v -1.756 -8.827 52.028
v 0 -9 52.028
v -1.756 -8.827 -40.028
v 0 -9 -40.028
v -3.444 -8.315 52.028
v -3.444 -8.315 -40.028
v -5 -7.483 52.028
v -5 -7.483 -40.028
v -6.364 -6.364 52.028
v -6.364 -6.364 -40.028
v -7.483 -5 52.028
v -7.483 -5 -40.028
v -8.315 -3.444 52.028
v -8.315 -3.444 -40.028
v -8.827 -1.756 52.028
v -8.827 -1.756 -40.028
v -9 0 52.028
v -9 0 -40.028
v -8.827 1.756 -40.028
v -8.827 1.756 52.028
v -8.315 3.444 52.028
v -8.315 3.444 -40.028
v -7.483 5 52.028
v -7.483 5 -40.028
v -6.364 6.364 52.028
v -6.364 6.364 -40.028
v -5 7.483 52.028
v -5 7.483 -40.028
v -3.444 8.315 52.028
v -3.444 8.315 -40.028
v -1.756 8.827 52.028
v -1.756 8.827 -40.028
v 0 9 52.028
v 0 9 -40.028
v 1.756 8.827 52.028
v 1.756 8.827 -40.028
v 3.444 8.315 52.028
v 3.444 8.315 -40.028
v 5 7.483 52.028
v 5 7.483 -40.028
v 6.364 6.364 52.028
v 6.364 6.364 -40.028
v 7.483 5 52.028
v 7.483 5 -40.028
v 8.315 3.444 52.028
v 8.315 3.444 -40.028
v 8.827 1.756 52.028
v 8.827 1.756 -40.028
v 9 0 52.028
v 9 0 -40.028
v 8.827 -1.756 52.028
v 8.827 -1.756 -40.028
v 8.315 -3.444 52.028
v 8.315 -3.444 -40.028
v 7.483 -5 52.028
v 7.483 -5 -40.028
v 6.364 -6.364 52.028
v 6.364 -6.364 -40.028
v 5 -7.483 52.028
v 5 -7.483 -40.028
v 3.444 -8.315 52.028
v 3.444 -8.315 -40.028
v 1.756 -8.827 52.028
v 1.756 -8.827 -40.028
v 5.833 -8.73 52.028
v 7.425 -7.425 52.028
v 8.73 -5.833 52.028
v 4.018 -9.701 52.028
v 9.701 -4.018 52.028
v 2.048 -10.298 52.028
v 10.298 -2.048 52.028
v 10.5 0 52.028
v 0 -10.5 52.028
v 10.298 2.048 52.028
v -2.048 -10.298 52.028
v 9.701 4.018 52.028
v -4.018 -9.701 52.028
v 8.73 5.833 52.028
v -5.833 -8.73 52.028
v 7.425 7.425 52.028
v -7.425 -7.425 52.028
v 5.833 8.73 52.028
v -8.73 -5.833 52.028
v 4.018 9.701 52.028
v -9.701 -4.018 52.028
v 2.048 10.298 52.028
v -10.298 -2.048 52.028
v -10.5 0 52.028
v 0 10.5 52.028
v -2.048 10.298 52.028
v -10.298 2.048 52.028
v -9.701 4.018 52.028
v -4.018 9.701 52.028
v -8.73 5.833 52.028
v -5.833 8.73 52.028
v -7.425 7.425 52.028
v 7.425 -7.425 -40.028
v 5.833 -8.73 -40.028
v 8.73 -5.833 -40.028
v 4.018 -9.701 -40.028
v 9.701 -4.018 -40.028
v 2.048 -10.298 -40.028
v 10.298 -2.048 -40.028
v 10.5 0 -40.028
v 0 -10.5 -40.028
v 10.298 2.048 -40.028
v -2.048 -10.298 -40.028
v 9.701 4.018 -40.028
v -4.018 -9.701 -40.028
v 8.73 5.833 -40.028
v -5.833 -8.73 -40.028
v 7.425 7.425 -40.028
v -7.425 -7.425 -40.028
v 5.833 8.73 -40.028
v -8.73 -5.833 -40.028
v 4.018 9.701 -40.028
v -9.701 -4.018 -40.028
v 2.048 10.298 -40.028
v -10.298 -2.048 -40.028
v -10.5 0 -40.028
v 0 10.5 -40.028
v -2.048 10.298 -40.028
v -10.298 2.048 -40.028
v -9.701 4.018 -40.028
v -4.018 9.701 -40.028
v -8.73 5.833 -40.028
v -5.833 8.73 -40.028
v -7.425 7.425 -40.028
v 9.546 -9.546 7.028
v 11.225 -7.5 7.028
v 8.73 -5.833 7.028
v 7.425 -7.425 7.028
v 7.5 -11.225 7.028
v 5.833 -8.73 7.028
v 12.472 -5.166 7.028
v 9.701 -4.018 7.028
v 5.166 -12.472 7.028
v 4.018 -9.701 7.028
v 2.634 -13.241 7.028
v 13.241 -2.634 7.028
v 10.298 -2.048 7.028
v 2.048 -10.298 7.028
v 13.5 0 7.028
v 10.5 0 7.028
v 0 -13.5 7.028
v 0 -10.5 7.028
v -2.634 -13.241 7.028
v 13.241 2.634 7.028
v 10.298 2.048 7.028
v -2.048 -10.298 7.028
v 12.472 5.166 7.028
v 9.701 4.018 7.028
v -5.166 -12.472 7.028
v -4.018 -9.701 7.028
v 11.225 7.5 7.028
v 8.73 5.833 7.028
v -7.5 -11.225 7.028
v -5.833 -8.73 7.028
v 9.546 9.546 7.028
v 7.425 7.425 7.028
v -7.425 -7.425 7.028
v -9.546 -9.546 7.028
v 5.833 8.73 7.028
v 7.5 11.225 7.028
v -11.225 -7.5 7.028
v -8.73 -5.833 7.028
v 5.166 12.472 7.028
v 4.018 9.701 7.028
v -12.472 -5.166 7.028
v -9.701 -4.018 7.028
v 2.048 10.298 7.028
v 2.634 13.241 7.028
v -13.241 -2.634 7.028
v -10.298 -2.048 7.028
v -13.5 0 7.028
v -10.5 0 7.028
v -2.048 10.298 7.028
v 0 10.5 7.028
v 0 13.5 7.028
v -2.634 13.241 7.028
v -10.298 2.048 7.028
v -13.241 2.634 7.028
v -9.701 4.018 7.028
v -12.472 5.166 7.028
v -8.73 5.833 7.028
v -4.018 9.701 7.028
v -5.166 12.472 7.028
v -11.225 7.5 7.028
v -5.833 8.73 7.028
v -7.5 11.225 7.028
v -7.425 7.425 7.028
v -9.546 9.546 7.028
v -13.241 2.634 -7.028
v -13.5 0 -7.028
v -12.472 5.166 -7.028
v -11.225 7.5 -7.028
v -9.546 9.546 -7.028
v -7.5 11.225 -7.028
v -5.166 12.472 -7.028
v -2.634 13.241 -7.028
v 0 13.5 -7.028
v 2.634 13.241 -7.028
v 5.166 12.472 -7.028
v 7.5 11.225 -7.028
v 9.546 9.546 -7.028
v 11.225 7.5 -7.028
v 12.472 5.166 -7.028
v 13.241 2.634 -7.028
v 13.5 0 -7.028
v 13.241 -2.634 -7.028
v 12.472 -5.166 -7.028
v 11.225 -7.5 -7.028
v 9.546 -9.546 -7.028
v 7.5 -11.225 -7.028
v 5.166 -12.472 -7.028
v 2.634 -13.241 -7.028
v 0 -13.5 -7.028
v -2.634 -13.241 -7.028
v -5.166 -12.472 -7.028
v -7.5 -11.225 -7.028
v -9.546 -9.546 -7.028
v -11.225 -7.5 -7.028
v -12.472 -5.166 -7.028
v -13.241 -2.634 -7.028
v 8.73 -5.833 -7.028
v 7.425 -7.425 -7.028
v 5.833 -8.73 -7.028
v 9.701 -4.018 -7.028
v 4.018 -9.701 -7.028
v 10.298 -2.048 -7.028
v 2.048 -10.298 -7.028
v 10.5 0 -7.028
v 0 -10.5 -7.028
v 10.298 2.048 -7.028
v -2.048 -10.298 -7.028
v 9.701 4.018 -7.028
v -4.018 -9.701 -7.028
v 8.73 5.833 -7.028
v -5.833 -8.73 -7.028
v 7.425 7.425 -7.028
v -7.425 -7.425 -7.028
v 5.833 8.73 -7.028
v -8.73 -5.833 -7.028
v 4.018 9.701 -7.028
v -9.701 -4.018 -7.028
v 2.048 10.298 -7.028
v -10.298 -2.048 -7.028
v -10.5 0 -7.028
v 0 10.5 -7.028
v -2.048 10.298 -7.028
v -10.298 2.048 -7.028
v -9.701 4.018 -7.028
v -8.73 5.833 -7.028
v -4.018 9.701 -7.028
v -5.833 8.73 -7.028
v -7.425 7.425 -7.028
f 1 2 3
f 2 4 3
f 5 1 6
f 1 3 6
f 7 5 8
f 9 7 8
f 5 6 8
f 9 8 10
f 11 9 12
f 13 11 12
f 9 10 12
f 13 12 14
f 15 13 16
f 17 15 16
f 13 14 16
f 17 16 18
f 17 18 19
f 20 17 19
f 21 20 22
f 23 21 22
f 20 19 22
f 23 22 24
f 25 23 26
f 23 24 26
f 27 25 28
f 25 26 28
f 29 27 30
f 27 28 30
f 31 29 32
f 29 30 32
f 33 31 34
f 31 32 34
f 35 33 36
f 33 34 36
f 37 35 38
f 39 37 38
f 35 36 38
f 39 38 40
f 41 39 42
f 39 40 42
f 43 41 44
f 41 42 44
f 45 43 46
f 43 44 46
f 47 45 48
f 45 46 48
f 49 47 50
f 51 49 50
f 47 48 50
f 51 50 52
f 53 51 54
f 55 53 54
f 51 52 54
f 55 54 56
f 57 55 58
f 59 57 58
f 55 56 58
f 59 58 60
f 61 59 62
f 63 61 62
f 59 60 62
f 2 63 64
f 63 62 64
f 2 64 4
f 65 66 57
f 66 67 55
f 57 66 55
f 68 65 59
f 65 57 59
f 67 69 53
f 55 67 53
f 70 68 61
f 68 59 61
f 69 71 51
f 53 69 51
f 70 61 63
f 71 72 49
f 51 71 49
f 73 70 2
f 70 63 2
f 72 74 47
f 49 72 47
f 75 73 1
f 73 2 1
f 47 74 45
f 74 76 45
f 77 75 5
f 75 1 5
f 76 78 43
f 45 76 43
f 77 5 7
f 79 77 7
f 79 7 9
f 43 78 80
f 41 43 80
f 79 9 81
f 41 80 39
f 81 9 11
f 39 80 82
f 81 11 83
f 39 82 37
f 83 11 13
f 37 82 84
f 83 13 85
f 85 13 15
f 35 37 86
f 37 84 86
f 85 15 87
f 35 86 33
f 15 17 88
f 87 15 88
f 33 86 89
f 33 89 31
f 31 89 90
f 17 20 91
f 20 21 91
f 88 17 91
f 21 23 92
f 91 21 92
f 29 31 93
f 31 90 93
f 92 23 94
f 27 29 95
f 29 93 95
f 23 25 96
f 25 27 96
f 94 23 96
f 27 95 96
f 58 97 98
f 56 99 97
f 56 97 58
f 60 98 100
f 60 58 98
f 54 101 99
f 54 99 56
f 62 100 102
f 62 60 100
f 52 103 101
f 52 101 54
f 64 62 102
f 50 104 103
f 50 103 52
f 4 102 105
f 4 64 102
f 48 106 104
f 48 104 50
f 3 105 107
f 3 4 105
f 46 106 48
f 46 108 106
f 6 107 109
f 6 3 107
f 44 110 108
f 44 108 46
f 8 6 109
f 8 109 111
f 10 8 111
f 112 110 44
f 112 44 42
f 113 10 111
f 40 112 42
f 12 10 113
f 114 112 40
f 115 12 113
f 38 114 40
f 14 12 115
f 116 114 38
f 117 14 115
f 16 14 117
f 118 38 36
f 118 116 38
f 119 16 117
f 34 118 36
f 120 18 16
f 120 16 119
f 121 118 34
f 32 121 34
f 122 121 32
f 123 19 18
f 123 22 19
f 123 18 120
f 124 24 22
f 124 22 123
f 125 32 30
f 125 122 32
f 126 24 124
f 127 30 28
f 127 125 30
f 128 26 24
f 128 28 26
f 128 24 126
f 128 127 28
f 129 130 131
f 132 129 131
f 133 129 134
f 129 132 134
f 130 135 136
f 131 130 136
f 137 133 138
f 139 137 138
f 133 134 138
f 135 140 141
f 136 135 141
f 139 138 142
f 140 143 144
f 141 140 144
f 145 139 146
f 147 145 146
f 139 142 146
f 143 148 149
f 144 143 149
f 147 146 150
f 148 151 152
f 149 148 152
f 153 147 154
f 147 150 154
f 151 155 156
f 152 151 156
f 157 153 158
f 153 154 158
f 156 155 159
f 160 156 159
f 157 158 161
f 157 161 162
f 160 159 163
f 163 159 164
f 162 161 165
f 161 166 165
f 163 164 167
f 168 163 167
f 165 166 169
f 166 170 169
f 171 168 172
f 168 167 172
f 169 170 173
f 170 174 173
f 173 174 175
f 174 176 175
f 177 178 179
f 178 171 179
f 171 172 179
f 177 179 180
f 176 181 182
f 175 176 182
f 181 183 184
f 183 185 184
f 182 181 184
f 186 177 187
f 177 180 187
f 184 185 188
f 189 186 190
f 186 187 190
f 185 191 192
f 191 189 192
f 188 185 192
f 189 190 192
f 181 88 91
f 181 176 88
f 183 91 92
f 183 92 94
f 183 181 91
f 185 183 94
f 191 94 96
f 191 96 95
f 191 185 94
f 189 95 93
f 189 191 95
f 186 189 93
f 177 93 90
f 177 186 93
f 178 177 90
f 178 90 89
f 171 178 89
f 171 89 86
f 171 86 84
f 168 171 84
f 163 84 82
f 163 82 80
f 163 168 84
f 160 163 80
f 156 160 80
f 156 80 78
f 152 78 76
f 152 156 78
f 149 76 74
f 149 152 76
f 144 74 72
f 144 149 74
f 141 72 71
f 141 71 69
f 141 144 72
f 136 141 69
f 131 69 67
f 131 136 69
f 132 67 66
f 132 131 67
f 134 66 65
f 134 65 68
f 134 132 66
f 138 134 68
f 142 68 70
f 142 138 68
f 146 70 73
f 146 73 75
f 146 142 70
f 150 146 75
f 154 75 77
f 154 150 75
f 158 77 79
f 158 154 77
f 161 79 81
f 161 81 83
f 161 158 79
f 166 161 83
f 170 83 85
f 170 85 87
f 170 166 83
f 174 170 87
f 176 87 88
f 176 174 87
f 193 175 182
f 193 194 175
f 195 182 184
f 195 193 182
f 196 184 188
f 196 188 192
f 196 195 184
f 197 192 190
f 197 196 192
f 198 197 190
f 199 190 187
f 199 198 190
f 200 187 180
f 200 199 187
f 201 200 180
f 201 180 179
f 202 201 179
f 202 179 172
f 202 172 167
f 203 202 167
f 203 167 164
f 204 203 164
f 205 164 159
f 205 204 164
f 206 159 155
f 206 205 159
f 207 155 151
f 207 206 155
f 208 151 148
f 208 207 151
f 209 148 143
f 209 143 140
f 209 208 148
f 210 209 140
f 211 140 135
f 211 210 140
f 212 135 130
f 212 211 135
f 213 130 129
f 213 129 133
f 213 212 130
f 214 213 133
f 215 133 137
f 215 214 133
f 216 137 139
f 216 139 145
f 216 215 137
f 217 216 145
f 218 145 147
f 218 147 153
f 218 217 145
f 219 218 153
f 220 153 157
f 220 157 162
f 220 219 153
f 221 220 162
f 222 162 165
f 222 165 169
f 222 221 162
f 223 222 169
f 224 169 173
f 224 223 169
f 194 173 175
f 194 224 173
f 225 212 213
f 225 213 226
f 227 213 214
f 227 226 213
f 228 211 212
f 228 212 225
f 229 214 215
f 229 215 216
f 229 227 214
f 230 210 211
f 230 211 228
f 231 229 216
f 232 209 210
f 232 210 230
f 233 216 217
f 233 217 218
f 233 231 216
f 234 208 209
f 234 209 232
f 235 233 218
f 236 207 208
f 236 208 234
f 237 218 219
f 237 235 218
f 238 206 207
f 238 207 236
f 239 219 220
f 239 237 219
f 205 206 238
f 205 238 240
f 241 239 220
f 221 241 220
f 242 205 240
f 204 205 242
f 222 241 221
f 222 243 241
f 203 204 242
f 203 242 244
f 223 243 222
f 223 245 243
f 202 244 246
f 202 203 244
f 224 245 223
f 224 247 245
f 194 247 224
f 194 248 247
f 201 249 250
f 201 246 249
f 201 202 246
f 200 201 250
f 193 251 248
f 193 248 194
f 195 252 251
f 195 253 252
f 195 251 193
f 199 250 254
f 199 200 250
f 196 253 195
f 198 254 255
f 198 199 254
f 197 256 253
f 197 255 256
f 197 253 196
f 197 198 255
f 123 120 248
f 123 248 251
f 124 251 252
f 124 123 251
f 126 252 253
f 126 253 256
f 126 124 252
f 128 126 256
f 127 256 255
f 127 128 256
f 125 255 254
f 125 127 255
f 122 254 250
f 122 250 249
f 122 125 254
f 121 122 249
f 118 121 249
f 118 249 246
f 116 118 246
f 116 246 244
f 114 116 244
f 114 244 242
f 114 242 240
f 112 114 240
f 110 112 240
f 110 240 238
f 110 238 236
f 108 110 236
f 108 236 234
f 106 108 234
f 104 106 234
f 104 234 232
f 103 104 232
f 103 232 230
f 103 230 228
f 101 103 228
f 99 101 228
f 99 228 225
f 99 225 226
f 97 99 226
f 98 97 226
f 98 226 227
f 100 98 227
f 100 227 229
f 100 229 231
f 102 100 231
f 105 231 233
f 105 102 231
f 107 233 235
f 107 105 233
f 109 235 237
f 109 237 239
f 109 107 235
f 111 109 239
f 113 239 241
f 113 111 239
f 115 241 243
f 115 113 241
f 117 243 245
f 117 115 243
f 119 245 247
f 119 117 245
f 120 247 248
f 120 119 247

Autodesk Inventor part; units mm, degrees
ref_plane "YZ Plane" through (0, 0, 0) normal (1, 0, 0) x (0, 1, 0)
ref_plane "XZ Plane" through (0, 0, 0) normal (0, 1, 0) x (-1, 0, 0)
ref_plane "XY Plane" through (0, 0, 0) normal (0, 0, 1) x (1, 0, 0)
sketch "Skizze1" plane through (0, 0, 0) normal (0, 1, 0) x (-1, 0, 0)
  line L0 (10.5, 52.028) -> (10.5, 7.028)
  line L1 (10.5, 7.028) -> (13.5, 7.028)
  line L2 (13.5, 7.028) -> (13.5, -7.028)
  line L3 (13.5, -7.028) -> (10.5, -7.028)
  line L4 (10.5, -7.028) -> (10.5, -40.028)
  line L5 (10.5, -40.028) -> (0, -40.028)
  line L6 (0, 52.028) -> (0, -40.028)
  line L7 (0, 0) -> (13.5, 0) construction
  line L8 (10.5, 52.028) -> (0, 52.028)
  point P0 (12, 7.028)
  dimension "d0" = 14.056
  dimension "d1" = 21
  dimension "d2" = 27
  dimension "d14" = 45
  dimension "d15" = 33
revolve "Umdrehung1" add sketch "Skizze1" angle 360 about axis through (0, 0, 52.028) along (0, 0, -1)
sketch "Skizze2" plane through (0, 0, 52.028) normal (0, 0, 1) x (1, 0, 0)
  point P0 (0, 0)
  point P1 (0, 0)
hole "Bohrung1" at (0, 0, 52.028) direction (0, 0, -1) diameter 18 end through all
properties part number "vernindung"
